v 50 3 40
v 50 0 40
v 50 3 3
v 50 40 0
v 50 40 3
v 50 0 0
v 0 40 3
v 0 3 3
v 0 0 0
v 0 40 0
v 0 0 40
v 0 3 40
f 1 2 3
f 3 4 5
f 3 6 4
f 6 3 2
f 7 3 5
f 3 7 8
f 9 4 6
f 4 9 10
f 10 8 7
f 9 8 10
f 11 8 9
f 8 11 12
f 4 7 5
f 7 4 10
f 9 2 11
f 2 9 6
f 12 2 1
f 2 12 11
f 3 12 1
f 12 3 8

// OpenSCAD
module lbracket() {
  // L-Bracket Dimensions
  width = 50;    // X axis
  depth_h = 40;  // Y axis (Horizontal)
  height_v = 40; // Z axis (Vertical)
  thickness = 3; // mm
  
  union() {
    // Horizontal Flange
    translate([0, 0, 0])
      cube([width, depth_h, thickness]);
    
    // Vertical Flange
    translate([0, 0, 0])
      cube([width, thickness, height_v]);
  }
  
  // Remove holes
  difference() {
    // Re-extract shape for hole positioning
    union() {
      translate([0, 0, 0])
        cube([width, depth_h, thickness]);
      translate([0, 0, 0])
        cube([width, thickness, height_v]);
    }
    
    // Hole parameters
    d_through = 4.5;
    d_counter = 8;
    h_counter = 2;
    
    // Horizontal Flange Holes
    for (y = [10, 30]) {
      translate([25, y, 0]) {
        // Counterbore on outer side (Z positive face)
        translate([0, 0, 1])
          cylinder(d = d_counter, h = h_counter, $fn=64);
        // Through Hole
        translate([0, 0, 0])
          cylinder(d = d_through, h = thickness, $fn=64);
      }
    }
    
    // Vertical Flange Holes
    for (z = [10, 30]) {
      translate([25, 0, z]) {
        // Counterbore on outer side (Y positive face)
        translate([0, 1, 0])
          cylinder(d = d_counter, h = h_counter, $fn=64);
        // Through Hole
        translate([0, 0, 0])
          cylinder(d = d_through, h = thickness, $fn=64);
      }
    }
  }
}

// Main - call module at top level
lbracket();
